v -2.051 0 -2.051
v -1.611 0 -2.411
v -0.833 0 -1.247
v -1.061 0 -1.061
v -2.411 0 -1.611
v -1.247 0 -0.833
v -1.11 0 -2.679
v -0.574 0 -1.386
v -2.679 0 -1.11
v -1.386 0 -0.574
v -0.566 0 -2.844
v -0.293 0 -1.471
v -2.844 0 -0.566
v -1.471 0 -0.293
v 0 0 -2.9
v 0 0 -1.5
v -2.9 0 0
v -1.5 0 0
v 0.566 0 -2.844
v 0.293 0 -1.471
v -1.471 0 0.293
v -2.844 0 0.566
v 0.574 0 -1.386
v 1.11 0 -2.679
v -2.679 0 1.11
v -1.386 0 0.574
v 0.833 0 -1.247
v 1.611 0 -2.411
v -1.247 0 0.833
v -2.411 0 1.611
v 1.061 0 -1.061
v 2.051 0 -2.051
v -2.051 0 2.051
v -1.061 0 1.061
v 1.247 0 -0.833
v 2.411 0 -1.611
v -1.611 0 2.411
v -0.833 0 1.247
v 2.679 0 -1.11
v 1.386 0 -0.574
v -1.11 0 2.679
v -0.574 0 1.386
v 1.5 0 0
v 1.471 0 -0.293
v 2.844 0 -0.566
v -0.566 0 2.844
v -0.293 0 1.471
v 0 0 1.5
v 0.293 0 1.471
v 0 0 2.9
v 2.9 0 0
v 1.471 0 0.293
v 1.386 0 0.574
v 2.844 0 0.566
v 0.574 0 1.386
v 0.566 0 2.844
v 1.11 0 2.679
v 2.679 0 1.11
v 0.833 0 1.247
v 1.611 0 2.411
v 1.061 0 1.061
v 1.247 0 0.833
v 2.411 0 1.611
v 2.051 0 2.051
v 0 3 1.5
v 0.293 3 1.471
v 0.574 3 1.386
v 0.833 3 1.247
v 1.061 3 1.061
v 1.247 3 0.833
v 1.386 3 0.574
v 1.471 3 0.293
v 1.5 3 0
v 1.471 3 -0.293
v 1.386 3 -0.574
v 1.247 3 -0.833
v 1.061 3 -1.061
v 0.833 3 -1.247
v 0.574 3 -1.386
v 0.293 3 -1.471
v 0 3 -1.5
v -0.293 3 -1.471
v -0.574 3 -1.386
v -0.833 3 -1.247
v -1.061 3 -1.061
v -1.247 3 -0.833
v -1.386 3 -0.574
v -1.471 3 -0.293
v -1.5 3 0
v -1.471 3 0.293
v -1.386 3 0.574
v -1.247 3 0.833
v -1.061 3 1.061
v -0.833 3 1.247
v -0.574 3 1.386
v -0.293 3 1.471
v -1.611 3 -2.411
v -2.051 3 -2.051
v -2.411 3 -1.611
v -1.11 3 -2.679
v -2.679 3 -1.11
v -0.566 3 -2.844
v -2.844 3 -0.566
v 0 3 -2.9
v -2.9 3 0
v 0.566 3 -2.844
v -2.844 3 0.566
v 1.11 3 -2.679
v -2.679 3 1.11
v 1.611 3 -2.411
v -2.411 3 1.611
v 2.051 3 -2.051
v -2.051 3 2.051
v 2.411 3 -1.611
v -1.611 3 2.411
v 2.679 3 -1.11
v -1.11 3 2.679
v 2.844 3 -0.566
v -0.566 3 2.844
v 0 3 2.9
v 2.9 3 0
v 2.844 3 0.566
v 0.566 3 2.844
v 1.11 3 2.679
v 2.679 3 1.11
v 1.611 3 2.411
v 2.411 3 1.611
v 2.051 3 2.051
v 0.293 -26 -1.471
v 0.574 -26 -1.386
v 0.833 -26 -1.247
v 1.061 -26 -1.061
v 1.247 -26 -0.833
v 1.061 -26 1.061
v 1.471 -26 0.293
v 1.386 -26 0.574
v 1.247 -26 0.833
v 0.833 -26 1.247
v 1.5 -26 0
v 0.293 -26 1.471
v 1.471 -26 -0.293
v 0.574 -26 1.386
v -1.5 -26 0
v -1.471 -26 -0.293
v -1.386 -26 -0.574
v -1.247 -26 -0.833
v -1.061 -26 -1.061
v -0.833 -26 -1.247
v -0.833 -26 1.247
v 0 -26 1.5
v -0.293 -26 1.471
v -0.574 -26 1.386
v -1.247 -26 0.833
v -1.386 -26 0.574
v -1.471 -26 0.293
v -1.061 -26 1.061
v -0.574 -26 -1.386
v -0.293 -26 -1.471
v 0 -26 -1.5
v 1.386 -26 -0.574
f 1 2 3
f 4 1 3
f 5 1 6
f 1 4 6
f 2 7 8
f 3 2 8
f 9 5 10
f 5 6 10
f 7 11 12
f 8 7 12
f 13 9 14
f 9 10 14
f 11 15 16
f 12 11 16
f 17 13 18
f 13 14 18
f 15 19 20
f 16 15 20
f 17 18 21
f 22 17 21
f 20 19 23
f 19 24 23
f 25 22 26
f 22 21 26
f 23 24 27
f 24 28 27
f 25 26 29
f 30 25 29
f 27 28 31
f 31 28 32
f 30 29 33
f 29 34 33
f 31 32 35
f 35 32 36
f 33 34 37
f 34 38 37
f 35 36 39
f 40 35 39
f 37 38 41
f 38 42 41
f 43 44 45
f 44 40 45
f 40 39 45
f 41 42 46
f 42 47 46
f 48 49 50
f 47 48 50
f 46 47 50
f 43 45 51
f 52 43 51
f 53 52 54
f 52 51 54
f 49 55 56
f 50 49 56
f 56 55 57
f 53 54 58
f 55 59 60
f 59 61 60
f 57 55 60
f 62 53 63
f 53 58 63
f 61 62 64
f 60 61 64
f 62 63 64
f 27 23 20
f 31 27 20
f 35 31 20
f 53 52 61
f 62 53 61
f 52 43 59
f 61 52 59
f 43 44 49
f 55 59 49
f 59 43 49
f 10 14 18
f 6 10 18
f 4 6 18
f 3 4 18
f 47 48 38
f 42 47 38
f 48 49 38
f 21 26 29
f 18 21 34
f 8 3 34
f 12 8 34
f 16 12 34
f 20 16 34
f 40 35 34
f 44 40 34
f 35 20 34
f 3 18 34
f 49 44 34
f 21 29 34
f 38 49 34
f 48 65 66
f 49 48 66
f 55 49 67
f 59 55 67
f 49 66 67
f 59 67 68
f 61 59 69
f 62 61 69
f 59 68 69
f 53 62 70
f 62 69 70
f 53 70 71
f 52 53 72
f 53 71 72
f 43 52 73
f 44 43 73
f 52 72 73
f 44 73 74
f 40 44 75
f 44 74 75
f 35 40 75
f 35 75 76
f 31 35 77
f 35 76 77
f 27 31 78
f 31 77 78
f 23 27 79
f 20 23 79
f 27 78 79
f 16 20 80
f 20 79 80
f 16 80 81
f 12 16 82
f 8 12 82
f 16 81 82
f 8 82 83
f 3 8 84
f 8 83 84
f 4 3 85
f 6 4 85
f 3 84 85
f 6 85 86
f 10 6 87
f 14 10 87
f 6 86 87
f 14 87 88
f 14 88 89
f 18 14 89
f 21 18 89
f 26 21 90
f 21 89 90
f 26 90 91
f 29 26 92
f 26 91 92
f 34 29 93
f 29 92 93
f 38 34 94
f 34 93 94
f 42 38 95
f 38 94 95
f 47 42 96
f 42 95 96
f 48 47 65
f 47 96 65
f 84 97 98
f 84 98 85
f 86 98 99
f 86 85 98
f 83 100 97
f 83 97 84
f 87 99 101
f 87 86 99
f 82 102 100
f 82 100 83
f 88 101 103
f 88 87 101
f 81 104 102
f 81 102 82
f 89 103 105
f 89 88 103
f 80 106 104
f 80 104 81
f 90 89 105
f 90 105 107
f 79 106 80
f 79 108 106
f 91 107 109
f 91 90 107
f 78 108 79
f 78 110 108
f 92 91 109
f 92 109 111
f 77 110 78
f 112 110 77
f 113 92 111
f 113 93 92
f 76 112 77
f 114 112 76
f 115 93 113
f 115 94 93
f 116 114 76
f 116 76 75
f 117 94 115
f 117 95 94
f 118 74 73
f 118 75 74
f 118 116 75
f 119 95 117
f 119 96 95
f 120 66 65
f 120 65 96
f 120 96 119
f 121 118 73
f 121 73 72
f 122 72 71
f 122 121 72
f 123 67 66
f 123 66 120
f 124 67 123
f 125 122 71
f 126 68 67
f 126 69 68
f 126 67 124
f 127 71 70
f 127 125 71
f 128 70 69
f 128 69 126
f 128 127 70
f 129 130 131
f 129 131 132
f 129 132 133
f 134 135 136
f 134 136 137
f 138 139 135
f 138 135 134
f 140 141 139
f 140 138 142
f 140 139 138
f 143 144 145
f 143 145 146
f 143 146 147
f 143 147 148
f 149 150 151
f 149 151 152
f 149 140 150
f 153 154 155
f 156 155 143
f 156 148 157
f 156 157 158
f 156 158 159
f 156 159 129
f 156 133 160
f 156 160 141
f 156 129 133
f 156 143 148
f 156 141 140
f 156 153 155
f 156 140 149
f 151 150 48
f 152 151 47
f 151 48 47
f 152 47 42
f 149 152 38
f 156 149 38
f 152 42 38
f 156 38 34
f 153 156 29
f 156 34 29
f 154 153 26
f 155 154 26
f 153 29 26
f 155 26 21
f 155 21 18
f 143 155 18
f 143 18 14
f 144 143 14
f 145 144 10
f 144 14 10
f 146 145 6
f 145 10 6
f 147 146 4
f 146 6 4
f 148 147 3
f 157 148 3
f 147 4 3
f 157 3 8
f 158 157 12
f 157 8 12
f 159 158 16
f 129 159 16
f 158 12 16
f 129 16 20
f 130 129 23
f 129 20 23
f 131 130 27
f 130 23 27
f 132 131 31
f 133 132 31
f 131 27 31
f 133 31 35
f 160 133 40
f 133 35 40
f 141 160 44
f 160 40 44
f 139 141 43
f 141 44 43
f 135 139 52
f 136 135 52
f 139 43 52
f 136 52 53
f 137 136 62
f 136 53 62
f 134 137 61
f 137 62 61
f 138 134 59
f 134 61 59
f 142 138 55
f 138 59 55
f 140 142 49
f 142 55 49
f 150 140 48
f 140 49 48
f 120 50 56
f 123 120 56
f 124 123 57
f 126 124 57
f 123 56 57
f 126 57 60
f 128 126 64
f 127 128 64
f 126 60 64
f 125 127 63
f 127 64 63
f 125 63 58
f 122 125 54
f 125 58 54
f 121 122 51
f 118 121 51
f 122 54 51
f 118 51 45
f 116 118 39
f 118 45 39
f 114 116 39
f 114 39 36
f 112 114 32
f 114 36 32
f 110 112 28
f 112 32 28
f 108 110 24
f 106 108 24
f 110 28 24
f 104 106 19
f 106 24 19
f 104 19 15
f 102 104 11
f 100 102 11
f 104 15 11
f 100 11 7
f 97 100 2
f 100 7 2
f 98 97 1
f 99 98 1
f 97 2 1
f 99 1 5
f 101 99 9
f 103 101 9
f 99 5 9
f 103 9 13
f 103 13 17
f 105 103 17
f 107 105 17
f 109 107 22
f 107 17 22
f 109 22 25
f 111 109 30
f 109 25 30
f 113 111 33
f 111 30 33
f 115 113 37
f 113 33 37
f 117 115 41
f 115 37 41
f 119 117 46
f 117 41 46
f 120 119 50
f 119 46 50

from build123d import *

# Parameters (mm, degrees)
SKETCH_1_R          = 2.9
EXTRUDE_1_DEPTH     = 3
SKETCH_2_R          = 1.5
CUT_EXTRUDE_1_DEPTH = 3
SKETCH_5_R          = 1.5
EXTRUDE_2_DEPTH     = 26


with BuildPart() as part:
    # 草图1 → 凸台-拉伸1 (new body)
    with BuildSketch(Plane(origin=(0, 0, 0), x_dir=(1, 0, 0), z_dir=(0, 1, 0))):
        with Locations(Location((0, 0, 0), (0, 0, 270))):
            Circle(SKETCH_1_R)
    extrude(amount=EXTRUDE_1_DEPTH)

    # 草图2 → 切除-拉伸1 (cut)
    with BuildSketch(Plane(origin=(0, 3, 0), x_dir=(1, 0, 0), z_dir=(0, 1, 0))):
        with Locations(Location((0, 0, 0), (0, 0, 270))):
            Circle(SKETCH_2_R)
    extrude(amount=-CUT_EXTRUDE_1_DEPTH, mode=Mode.SUBTRACT)


with BuildPart() as body_2:
    # 草图5 → 凸台-拉伸2 (new body)
    with BuildSketch(Plane.XZ):
        with Locations(Location((0, 0, 0), (0, 0, 90))):
            Circle(SKETCH_5_R)
    extrude(amount=EXTRUDE_2_DEPTH)


solid = Compound([part.part, body_2.part])
